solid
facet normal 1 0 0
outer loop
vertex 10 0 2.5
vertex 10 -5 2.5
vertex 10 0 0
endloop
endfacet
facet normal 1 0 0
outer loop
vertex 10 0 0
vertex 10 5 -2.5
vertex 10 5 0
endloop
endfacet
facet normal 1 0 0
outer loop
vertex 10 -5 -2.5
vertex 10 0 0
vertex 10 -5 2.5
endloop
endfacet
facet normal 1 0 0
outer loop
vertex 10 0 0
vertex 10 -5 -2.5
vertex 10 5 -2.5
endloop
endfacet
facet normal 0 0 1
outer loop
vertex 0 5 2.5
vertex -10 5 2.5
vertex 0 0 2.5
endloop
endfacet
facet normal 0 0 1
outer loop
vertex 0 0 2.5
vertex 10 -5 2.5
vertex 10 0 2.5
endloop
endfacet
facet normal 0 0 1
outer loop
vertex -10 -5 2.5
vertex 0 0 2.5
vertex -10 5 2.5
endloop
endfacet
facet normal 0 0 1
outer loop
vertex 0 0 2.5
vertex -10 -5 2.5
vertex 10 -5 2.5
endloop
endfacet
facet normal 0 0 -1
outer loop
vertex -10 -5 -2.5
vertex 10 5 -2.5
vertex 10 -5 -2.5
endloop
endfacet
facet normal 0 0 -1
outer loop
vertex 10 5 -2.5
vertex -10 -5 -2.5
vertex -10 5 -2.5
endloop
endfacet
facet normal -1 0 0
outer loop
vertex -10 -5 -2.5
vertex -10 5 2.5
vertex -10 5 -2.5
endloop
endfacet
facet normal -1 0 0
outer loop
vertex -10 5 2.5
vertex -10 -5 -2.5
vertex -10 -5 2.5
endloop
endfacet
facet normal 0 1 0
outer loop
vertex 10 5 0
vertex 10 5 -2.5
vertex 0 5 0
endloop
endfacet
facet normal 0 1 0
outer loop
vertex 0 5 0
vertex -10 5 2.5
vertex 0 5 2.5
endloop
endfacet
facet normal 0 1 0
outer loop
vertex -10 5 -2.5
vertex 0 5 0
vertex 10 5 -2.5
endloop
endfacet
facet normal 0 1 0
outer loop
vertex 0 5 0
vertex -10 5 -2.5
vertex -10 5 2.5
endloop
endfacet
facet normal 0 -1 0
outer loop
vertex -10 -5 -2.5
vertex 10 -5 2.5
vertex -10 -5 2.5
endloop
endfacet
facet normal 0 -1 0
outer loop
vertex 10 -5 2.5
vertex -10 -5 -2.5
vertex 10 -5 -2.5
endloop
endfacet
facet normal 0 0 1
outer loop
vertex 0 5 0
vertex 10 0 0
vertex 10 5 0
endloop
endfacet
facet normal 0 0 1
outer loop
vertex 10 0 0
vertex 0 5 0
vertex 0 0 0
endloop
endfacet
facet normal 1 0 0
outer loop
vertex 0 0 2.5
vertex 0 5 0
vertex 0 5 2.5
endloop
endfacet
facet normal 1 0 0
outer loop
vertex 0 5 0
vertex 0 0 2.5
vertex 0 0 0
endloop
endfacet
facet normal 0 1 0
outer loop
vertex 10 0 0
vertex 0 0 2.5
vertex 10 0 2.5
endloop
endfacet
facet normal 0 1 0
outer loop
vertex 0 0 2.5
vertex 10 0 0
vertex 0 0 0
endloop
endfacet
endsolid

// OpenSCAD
// Generated by generate_scads.py
difference() {
  cube(size=[20,10,5], center=true);
  intersection() {
    cube(size=[25,20,20], center=false);
  }
}
